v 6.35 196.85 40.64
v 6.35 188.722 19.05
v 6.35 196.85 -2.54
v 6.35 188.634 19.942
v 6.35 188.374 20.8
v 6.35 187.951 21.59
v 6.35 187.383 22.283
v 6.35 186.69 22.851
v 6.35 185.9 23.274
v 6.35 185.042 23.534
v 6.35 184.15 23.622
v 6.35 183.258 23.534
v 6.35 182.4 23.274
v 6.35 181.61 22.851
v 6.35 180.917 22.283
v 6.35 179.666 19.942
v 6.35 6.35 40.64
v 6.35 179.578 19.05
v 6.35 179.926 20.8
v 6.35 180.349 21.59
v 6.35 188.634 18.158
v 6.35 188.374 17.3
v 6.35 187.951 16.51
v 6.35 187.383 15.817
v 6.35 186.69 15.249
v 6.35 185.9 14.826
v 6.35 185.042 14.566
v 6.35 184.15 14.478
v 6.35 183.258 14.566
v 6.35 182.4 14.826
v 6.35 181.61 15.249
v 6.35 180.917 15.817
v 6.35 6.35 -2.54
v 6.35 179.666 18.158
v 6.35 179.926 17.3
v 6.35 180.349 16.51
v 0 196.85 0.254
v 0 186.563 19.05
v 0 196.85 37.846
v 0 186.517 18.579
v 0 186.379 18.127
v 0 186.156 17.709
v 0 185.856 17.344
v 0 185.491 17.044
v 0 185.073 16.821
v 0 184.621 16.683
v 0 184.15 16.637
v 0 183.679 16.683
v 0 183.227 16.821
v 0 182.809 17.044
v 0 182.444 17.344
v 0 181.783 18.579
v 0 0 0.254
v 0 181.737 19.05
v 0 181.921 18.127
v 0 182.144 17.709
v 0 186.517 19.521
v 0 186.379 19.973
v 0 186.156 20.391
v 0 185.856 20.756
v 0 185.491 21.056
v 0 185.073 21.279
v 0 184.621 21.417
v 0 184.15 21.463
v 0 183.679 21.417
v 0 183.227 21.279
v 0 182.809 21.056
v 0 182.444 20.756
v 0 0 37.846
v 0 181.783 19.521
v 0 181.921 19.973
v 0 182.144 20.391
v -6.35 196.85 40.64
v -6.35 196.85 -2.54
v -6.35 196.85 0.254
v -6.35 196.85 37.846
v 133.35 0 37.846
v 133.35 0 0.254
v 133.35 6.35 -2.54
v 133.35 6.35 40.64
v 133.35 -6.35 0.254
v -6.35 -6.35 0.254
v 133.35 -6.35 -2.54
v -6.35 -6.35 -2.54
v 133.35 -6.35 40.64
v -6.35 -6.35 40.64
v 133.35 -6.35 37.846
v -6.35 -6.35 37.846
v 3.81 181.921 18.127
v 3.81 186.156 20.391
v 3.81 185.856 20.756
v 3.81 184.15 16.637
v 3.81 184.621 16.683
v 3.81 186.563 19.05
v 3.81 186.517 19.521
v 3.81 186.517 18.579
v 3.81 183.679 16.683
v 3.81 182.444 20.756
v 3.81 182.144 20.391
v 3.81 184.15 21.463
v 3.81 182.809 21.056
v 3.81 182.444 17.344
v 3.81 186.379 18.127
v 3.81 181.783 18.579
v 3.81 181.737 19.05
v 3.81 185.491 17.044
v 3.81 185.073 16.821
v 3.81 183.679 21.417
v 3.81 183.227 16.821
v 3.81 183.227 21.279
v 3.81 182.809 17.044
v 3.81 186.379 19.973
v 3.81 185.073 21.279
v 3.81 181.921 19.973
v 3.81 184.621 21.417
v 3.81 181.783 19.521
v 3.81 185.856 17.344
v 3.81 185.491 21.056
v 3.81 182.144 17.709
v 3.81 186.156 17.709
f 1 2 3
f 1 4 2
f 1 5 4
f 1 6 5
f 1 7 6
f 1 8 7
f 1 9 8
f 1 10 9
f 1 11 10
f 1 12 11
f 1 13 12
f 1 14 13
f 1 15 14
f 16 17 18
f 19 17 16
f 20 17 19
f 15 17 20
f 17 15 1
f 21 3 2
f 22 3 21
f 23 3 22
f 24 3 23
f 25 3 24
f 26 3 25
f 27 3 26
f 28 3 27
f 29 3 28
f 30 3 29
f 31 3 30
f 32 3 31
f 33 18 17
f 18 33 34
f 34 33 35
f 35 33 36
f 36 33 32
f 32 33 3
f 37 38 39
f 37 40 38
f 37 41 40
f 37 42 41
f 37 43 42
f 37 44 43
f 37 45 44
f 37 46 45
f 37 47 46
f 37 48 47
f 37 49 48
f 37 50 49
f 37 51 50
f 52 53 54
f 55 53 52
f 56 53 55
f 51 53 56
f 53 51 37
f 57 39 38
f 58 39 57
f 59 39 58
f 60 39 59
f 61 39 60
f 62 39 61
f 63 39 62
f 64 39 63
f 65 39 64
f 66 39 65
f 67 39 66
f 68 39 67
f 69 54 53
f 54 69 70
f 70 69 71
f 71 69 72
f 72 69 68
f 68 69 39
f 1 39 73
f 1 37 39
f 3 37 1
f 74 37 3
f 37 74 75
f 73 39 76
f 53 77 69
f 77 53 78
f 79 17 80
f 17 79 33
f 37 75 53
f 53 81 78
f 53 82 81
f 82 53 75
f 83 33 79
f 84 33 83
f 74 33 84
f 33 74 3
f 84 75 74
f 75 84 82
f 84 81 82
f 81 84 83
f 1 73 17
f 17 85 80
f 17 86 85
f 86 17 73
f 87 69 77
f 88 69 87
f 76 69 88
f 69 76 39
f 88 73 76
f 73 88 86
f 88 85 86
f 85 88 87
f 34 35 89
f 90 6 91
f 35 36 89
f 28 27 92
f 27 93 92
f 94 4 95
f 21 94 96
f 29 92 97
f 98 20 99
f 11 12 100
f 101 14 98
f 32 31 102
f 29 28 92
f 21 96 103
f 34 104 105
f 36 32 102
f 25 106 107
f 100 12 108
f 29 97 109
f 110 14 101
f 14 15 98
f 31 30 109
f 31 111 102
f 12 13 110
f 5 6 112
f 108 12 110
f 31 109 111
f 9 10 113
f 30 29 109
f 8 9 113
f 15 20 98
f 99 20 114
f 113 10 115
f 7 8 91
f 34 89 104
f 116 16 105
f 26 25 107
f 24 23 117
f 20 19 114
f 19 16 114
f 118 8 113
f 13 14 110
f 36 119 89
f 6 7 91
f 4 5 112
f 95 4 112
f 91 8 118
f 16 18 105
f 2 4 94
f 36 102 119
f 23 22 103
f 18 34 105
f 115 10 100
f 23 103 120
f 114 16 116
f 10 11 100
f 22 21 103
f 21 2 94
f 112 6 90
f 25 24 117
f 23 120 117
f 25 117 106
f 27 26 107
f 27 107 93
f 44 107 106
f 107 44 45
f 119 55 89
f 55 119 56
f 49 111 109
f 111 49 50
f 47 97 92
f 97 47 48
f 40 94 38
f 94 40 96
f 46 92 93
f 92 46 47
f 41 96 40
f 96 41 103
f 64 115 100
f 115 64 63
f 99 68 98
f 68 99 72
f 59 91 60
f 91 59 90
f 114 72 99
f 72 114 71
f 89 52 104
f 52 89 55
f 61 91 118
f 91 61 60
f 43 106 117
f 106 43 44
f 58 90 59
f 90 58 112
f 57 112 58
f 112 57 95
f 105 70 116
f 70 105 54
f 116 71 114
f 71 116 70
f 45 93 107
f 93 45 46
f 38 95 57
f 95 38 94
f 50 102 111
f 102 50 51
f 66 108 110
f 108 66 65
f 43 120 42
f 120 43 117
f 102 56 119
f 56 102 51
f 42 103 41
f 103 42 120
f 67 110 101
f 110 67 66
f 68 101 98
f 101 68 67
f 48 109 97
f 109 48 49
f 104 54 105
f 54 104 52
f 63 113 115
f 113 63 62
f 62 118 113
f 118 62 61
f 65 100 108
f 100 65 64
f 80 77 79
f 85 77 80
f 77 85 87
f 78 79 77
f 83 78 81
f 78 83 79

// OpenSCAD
// file: _cat_door_u_liner_lib.scad
// Cat door U-shaped liner - shared geometry.
// Fits into a rectangular box cut into a door, lining the bottom and
// two sides with a thin wall so a smaller insert seats snugly in the gap.
// Top of the U is left open.
//
// Flanges at the front and/or back cap the ends, sitting flush against
// the door's face and overlapping the cut edge to hide it.
//
// The full part (10.5in wide) is too wide for a 256mm printer bed, so it's
// split down the middle of the bottom rail into two L-shaped halves - see
// cat_door_u_liner_left.scad / cat_door_u_liner_right.scad, which include
// this file and call render_liner(). This file has no directly renderable
// geometry of its own (build_stl.py skips files starting with "_").

// ---- Parameters (inches) ----
door_depth      = 1.5;   // door thickness (liner spans this, Z)
box_width       = 10.5;  // width of the cutout in the door (X)
box_height      = 7.75;  // height of the cutout in the door (Y)
wall            = 0.25;  // thickness of the liner material (the gap it fills)

flange_front    = true;  // add a flange on the front face
flange_back     = true;  // add a flange on the back face
flange_overlap  = 0.25;  // how far the flange extends past the cut edge
flange_thick    = 0.1;   // flange thickness (Z), kept small/low-profile

screw_holes     = true;  // add mounting screw holes through the two legs
screw_hole_dia  = 0.19;  // clearance diameter for the screw shank (~#8 screw)
screw_hole_inset = 0.5;  // distance in from the tip (open end) of each leg

countersink       = true; // recess for a flat/flush screw head, on the inner face
countersink_dia   = 0.36; // head diameter (~#8 flat-head screw)
countersink_depth = 0.1;  // how deep the taper cuts into the leg (< wall)

split_x = box_width / 2; // where to cut the bottom rail into two halves
                          // (centered; well clear of the screw holes near
                          // each leg, so the cut doesn't hit any hardware)

eps = 0.01; // small overlap so flange and liner fuse into one solid
big = 1000; // far outside the model, used to build clipping half-spaces

// ---- Model ----
// U shape: two side rectangles + one bottom rectangle, open at the top.
// w/h are the outer footprint, wall_thick the leg width, spanning z0..z1,
// shifted by (x_off, y_off) so a flange can grow outward from the liner.
module u_shape(w, h, wall_thick, z0, z1, x_off = 0, y_off = 0) {
    zt = z1 - z0;
    translate([x_off, y_off, z0]) {
        cube([wall_thick, h, zt]);                       // left side
        translate([w - wall_thick, 0, 0])
            cube([wall_thick, h, zt]);                    // right side
        cube([w, wall_thick, zt]);                        // bottom
    }
}

// Horizontal screw hole through one leg only (not the flange), so a screw
// bites into the solid door beside the cutout. Bored outward through the
// leg's outer face (x_start), centered on the leg's depth (Z), clear of
// the flanges which only occupy the ends of the Z range.
module screw_hole_leg(x_start, y_pos) {
    translate([x_start - eps, y_pos, door_depth / 2])
        rotate([0, 90, 0])
            cylinder(h = wall + 2 * eps, d = screw_hole_dia, $fn = 32);
}

// Countersink taper on the inner face (box-interior side) of a leg, where
// the screw head seats. dir = -1 for the left leg (inner face is the leg's
// high-x side, cone narrows toward -x); dir = +1 for the right leg (inner
// face is the low-x side, cone narrows toward +x).
module countersink_leg(x_face, y_pos, dir) {
    d1 = (dir < 0) ? screw_hole_dia : countersink_dia;
    d2 = (dir < 0) ? countersink_dia : screw_hole_dia;
    x0 = (dir < 0) ? x_face - countersink_depth : x_face;
    translate([x0, y_pos, door_depth / 2])
        rotate([0, 90, 0])
            cylinder(h = countersink_depth, d1 = d1, d2 = d2, $fn = 32);
}

module cat_door_liner() {
    difference() {
        union() {
            // Main liner, filling the through-hole depth
            u_shape(box_width, box_height, wall, 0, door_depth);

            // Front flange: sits in front of the door face (z < 0), wider
            // than the hole so it overlaps and hides the cut on 3 sides
            if (flange_front)
                u_shape(box_width + 2 * flange_overlap, box_height + flange_overlap,
                        wall + flange_overlap, -flange_thick, eps,
                        -flange_overlap, -flange_overlap);

            // Back flange: mirrors the front, behind the door face
            if (flange_back)
                u_shape(box_width + 2 * flange_overlap, box_height + flange_overlap,
                        wall + flange_overlap, door_depth - eps, door_depth + flange_thick,
                        -flange_overlap, -flange_overlap);
        }

        if (screw_holes) {
            y_pos = box_height - screw_hole_inset;
            screw_hole_leg(0, y_pos);                 // left leg, out through x=0
            screw_hole_leg(box_width - wall, y_pos);  // right leg, out through x=box_width

            if (countersink) {
                countersink_leg(wall, y_pos, -1);            // left leg, inner face
                countersink_leg(box_width - wall, y_pos, 1); // right leg, inner face
            }
        }
    }
}

// Keeps only the x <= split_x (or x >= split_x) portion of the liner, for
// printing as two separate pieces that join at the middle of the bottom rail.
module cat_door_liner_part(part) {
    if (part == "left")
        intersection() {
            cat_door_liner();
            translate([-big, -big, -big]) cube([big + split_x, 2 * big, 2 * big]);
        }
    else if (part == "right")
        intersection() {
            cat_door_liner();
            translate([split_x, -big, -big]) cube([big + (box_width - split_x), 2 * big, 2 * big]);
        }
    else
        cat_door_liner();
}

// All dimensions above are in inches; STL files carry no unit, and slicers
// (Elegoo/Cura/PrusaSlicer/etc.) assume mm, so scale the output to mm here
// to keep the real-world size correct on import.
module render_liner(part = "whole") {
    mm_per_inch = 25.4;
    scale([mm_per_inch, mm_per_inch, mm_per_inch])
        cat_door_liner_part(part);
}
// main file
// Left half of the cat door U liner (fits a 256mm bed). See
// _cat_door_u_liner_lib.scad for parameters and the right half.
include <_cat_door_u_liner_lib.scad>
render_liner("left");
